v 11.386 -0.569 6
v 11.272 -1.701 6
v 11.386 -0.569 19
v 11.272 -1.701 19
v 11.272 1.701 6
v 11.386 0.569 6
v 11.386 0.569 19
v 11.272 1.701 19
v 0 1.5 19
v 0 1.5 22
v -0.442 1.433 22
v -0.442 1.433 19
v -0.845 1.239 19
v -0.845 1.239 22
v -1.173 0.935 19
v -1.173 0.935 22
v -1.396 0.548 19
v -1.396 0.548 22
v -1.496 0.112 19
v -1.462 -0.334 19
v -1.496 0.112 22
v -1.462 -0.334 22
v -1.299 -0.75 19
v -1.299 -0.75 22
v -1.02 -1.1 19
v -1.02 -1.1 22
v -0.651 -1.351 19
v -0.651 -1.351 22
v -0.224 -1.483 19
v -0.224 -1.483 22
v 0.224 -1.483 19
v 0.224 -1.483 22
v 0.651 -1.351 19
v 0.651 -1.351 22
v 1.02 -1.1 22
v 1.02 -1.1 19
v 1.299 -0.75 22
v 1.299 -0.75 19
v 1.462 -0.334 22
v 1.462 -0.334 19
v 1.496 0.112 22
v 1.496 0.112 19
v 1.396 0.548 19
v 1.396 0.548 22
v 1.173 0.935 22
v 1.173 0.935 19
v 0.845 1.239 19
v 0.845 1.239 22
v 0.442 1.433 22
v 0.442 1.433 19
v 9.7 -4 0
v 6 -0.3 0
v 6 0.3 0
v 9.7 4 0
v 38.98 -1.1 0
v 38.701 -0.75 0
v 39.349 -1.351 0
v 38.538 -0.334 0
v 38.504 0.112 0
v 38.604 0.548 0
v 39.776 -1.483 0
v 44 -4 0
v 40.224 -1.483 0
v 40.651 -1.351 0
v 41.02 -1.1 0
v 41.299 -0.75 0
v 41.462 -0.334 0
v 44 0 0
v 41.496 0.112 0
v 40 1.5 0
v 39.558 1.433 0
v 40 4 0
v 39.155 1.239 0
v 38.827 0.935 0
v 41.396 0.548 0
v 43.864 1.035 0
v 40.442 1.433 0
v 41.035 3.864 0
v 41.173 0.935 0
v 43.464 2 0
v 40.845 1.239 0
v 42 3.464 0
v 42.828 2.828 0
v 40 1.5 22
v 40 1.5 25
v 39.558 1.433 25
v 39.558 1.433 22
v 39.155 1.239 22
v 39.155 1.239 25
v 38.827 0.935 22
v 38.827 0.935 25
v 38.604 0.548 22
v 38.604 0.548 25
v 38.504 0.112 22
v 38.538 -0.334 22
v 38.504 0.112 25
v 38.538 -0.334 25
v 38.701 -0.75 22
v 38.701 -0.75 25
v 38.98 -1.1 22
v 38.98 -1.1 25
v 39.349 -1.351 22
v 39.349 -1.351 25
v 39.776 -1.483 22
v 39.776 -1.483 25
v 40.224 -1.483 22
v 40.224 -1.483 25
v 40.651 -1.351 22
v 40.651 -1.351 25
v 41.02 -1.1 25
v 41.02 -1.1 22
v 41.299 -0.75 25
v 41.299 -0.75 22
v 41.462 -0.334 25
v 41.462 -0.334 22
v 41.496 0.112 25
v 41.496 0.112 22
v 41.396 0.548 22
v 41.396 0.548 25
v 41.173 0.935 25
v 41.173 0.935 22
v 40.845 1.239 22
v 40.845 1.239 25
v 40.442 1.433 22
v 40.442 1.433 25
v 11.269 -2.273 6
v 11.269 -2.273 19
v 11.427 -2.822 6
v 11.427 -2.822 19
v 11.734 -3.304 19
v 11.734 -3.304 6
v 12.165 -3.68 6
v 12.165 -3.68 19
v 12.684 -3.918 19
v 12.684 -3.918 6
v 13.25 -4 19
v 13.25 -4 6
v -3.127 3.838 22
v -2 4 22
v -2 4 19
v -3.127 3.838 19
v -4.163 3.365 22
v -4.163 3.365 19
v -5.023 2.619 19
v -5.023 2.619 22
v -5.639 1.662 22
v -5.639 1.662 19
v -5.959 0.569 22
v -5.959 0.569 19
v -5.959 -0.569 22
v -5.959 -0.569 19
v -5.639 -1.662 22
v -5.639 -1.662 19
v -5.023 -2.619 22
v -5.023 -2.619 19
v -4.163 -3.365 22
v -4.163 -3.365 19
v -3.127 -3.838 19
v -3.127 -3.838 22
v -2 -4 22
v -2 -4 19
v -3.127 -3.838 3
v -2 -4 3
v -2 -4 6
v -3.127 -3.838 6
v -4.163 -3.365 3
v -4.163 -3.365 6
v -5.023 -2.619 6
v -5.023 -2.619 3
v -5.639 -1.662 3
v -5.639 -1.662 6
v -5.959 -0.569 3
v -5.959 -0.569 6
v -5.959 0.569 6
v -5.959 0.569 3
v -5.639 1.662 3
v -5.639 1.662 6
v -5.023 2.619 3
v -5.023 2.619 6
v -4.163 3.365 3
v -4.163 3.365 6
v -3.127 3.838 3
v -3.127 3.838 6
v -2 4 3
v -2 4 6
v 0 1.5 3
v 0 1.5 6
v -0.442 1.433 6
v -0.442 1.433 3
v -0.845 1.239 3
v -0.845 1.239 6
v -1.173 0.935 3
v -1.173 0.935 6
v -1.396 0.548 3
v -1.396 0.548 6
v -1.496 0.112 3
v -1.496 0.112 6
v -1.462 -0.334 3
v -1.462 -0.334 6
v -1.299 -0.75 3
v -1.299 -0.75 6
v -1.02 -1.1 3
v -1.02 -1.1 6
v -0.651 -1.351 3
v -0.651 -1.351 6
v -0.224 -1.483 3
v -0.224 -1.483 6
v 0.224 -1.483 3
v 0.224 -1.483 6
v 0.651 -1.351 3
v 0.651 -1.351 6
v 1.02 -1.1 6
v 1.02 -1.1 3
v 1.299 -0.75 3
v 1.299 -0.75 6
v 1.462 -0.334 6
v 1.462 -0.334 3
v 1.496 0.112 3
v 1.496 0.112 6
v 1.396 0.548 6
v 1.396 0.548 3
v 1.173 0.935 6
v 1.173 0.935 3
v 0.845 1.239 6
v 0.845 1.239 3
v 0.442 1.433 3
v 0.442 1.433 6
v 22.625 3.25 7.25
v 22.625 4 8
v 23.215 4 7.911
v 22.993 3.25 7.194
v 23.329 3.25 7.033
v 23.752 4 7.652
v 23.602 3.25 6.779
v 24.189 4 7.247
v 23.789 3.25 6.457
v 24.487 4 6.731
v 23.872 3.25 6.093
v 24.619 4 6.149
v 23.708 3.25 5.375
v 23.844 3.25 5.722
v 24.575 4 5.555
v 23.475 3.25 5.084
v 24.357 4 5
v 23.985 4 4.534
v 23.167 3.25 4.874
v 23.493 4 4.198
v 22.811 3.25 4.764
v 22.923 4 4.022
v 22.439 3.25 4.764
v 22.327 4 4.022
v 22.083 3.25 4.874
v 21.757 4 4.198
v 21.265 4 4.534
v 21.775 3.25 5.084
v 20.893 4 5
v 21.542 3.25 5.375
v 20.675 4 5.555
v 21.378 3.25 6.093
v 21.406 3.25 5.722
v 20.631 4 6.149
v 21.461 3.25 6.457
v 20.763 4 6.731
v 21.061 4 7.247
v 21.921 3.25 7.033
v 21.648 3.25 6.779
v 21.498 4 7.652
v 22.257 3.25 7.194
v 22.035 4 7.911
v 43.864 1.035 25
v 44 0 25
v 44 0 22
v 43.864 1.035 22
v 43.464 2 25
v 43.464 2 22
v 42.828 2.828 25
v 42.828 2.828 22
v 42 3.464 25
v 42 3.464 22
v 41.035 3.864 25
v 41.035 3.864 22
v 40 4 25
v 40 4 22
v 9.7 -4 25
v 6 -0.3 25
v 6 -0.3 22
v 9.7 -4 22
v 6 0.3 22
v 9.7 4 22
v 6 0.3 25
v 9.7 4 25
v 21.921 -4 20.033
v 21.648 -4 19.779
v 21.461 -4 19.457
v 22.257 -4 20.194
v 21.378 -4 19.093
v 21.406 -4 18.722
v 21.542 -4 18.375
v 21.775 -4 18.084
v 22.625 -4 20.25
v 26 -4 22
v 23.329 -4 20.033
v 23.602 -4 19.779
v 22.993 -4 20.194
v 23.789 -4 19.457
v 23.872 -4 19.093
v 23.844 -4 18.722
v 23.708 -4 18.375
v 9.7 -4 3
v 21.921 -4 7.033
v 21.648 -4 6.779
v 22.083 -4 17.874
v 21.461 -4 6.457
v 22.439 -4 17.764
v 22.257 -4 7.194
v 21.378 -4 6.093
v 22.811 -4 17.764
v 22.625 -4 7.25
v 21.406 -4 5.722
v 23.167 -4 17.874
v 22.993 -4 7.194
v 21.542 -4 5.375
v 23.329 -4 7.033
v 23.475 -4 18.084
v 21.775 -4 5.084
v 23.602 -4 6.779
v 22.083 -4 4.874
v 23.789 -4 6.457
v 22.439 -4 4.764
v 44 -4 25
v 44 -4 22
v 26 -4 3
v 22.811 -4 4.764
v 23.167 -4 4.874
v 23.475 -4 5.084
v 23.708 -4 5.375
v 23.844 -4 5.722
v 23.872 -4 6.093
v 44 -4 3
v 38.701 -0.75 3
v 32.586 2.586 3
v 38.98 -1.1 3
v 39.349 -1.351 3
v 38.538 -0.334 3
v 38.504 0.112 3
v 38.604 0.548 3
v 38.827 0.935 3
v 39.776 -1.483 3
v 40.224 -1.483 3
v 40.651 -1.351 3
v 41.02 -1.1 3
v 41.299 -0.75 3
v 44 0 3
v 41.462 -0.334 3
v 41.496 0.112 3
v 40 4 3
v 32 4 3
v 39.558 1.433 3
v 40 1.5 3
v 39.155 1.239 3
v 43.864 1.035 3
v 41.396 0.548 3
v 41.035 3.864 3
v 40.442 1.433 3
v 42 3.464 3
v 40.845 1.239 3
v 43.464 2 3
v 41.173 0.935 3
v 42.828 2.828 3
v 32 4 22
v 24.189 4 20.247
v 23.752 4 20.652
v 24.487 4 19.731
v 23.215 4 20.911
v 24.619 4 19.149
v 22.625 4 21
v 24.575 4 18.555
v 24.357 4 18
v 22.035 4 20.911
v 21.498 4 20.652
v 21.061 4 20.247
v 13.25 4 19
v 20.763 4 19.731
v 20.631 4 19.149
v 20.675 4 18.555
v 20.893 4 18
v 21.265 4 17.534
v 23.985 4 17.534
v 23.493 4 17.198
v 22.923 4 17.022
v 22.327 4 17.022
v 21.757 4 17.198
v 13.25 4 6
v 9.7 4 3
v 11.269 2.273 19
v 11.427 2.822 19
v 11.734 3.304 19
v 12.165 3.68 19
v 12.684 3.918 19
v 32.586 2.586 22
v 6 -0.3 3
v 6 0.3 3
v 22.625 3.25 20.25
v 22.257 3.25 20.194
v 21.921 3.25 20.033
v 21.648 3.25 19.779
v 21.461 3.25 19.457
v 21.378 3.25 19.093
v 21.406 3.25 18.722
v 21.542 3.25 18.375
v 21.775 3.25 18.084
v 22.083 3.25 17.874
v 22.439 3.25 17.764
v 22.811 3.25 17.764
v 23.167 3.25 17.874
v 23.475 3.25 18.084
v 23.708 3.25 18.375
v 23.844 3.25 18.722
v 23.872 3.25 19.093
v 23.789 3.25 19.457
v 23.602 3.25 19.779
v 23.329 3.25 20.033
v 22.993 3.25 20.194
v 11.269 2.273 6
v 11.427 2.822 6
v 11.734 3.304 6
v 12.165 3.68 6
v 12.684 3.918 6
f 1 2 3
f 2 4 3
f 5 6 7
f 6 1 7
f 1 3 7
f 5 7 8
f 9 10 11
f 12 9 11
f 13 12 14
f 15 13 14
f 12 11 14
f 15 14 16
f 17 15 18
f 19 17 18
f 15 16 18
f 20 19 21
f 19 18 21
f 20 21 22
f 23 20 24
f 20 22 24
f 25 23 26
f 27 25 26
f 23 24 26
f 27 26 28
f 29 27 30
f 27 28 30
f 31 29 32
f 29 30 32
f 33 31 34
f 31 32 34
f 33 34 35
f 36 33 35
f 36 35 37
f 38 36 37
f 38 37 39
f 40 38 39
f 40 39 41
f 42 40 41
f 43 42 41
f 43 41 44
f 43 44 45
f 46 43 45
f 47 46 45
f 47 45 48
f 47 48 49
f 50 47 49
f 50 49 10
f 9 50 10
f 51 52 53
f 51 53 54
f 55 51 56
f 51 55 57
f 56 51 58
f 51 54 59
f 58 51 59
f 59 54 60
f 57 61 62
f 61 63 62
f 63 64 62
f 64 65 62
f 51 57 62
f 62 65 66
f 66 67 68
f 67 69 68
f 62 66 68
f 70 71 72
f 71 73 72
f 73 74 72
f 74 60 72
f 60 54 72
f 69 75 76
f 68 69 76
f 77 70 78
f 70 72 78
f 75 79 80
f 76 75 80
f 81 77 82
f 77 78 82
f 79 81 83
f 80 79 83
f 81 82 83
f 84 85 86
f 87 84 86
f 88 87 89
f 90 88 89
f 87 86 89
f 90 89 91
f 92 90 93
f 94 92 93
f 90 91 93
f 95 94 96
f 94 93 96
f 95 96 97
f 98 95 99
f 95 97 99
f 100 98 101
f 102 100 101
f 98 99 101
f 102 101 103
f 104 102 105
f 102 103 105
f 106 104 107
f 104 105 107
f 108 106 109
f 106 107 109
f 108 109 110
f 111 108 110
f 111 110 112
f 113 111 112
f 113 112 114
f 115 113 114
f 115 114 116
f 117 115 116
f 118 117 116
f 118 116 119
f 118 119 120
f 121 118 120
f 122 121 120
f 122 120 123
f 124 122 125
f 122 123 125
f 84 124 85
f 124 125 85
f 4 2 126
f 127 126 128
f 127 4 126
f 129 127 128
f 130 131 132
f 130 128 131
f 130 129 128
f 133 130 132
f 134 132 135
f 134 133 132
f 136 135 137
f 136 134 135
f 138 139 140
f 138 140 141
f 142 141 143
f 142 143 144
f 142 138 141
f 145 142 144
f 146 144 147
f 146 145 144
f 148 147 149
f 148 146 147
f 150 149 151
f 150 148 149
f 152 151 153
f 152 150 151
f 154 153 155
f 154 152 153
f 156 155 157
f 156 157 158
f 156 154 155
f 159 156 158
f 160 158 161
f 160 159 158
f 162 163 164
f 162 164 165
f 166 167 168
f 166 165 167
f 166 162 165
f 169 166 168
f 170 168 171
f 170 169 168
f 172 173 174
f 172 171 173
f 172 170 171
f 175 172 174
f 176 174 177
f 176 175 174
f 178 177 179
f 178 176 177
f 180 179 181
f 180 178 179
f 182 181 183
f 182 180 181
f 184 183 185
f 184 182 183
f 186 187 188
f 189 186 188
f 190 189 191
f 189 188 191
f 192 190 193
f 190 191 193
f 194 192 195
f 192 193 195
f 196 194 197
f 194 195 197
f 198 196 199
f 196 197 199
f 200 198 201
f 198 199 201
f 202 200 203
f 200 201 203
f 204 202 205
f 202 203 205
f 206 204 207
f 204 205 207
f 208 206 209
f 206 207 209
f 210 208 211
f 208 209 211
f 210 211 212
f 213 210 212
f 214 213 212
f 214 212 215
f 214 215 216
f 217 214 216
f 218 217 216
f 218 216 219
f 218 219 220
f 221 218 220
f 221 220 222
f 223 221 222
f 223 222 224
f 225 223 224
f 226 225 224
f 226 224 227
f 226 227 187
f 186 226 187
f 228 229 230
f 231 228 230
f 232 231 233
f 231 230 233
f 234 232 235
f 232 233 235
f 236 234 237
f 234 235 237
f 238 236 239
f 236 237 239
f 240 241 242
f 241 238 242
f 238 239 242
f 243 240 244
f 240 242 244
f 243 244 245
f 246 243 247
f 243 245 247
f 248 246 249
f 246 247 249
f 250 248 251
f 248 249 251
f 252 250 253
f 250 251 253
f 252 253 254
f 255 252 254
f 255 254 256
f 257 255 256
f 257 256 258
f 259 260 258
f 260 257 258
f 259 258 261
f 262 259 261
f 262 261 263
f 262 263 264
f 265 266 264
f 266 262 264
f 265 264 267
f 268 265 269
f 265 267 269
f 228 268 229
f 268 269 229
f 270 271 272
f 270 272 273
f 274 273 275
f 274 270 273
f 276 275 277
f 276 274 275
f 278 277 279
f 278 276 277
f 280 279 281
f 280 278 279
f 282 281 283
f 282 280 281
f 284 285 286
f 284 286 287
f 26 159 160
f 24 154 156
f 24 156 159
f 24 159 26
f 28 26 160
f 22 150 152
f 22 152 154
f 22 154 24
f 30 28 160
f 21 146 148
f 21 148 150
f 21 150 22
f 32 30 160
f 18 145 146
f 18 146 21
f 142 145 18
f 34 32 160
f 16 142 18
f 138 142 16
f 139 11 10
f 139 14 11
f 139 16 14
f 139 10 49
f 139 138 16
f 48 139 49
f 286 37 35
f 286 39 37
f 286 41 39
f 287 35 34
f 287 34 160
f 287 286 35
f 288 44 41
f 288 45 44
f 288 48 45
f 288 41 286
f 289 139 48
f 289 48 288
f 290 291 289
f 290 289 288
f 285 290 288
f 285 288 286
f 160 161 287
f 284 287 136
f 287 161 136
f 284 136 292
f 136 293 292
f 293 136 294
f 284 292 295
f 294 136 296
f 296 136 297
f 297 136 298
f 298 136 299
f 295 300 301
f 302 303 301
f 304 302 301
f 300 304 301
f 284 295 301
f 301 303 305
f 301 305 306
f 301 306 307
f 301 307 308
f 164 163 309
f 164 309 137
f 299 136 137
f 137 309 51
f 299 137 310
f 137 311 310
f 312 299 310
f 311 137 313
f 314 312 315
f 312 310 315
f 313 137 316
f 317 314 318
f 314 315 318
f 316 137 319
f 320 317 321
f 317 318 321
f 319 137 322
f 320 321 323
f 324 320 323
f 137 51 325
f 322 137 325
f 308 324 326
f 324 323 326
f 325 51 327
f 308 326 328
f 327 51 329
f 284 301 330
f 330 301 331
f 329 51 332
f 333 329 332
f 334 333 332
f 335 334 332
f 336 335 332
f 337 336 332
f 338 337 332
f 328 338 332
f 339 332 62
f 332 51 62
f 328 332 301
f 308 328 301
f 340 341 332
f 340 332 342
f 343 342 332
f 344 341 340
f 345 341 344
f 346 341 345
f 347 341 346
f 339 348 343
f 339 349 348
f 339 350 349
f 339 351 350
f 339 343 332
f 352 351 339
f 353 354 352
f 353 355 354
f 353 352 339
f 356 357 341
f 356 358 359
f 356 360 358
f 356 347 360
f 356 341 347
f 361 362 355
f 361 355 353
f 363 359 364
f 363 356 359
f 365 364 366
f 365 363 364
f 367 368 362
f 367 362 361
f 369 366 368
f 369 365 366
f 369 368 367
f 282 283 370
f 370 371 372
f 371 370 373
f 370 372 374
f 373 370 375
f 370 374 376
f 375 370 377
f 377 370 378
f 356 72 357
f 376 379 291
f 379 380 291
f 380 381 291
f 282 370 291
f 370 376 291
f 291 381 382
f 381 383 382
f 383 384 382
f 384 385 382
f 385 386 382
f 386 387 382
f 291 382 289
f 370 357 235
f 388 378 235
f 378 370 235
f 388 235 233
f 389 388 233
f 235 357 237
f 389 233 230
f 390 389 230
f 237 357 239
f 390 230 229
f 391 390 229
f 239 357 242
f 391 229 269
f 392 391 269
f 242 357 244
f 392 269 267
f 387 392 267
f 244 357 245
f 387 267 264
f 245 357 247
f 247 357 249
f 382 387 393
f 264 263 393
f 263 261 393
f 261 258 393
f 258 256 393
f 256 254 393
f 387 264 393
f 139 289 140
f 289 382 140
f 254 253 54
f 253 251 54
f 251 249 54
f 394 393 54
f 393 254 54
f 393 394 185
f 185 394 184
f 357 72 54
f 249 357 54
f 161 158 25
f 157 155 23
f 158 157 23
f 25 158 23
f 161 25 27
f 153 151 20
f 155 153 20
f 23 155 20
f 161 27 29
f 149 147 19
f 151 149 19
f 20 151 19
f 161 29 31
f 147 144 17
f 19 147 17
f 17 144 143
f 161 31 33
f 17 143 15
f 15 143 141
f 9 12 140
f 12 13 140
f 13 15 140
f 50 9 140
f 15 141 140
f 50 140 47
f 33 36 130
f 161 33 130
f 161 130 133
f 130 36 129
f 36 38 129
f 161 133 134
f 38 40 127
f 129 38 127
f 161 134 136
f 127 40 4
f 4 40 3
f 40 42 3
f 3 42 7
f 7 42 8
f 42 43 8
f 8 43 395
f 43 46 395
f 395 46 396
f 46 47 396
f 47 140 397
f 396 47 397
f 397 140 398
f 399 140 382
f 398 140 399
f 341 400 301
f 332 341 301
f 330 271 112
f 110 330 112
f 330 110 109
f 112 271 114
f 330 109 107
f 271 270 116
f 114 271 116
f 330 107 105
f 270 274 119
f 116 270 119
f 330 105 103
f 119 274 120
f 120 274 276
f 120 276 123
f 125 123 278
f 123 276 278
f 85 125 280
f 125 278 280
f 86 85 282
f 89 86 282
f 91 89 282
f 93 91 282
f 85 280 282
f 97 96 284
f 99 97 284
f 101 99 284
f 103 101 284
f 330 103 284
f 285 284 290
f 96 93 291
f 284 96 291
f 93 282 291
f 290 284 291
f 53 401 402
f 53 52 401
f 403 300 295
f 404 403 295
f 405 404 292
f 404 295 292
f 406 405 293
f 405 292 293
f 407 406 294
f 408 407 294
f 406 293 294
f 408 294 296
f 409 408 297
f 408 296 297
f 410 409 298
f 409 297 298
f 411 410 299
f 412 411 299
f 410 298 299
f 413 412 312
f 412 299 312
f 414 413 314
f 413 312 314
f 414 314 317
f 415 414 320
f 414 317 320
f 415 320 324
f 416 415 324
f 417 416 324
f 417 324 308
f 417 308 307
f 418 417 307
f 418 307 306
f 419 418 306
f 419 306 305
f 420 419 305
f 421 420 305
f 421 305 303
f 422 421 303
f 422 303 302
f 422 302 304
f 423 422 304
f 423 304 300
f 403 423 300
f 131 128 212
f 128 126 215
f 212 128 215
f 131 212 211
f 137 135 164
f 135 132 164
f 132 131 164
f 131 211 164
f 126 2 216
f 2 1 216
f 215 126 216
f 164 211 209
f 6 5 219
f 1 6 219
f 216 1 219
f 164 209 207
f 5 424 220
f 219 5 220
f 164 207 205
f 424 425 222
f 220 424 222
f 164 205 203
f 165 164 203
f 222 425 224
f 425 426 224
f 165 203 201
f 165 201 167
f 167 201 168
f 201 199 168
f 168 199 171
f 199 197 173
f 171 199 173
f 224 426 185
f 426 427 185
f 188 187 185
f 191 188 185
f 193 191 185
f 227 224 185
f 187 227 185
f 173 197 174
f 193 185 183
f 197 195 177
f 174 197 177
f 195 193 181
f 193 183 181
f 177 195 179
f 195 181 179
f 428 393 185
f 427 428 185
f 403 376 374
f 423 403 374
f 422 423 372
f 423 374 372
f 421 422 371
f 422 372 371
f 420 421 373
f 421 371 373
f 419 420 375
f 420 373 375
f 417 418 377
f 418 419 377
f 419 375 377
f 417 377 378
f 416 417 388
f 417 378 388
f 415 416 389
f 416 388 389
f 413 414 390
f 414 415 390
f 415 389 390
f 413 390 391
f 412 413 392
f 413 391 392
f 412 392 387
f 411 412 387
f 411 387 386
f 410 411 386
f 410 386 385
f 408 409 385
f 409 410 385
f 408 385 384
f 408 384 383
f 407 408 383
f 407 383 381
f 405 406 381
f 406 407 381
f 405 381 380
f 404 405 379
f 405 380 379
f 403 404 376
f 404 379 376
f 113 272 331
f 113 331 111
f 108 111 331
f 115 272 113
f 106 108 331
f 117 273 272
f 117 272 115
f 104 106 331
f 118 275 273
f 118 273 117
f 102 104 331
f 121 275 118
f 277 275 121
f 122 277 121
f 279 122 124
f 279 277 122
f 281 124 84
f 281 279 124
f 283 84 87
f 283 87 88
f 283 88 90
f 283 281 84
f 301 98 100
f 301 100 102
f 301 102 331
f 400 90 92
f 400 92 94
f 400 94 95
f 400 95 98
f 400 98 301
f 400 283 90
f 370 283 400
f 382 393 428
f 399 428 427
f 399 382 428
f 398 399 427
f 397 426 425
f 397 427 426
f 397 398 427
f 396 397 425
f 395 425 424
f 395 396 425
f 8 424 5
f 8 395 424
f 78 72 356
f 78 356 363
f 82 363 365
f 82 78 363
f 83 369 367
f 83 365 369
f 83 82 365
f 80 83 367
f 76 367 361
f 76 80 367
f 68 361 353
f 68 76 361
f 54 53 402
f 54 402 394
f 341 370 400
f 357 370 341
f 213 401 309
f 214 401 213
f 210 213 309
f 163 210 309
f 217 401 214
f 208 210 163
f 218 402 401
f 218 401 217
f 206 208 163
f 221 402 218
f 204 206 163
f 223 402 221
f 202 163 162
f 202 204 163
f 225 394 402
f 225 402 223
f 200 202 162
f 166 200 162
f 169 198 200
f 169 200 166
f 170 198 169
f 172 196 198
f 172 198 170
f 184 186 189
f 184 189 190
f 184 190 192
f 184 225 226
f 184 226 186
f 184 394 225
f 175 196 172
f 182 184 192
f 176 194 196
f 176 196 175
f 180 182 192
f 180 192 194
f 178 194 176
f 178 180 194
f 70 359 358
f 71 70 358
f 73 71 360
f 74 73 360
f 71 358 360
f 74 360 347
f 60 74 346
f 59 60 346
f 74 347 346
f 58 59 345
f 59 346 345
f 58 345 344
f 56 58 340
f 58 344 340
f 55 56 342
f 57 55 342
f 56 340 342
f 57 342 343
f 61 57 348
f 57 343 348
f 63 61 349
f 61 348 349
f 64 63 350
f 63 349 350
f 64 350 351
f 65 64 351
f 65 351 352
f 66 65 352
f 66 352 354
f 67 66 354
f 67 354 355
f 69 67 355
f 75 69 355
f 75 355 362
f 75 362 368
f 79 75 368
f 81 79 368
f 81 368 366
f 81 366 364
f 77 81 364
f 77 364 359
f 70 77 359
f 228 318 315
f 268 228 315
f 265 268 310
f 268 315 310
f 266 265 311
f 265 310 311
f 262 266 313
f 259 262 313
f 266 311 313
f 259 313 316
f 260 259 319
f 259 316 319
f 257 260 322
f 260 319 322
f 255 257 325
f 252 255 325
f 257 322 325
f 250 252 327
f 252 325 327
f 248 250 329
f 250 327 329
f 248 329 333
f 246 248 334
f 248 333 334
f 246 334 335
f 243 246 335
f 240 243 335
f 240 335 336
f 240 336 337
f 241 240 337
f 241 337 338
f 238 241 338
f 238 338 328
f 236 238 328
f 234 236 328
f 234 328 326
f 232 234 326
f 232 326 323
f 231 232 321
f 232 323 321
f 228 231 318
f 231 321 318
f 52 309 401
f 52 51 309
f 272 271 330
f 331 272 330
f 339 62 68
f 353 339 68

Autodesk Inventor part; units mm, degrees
ref_plane "YZ Plane" through (0, 0, 0) normal (1, 0, 0) x (0, 1, 0)
ref_plane "XZ Plane" through (0, 0, 0) normal (0, 1, 0) x (-1, 0, 0)
ref_plane "XY Plane" through (0, 0, 0) normal (0, 0, 1) x (1, 0, 0)
sketch "Skizze1" plane through (0, 0, 0) normal (0, 0, 1) x (1, 0, 0)
  circle A0 centre (0, 0) radius 4 construction
  circle A1 centre (40, 0) radius 4 construction
  line L0 (0, 0) -> (40, 0) construction
  arc A2 (0, 4) -> (0, -4) centre (0, 0) ccw
  arc A3 (44, 0) -> (40, 4) centre (40, 0) ccw
  line L1 (0, 4) -> (40, 4)
  line L2 (0, -4) -> (44, -4)
  line L3 (44, -4) -> (44, 0)
  dimension "d0" = 8
  dimension "d1" = 40
extrude "Extrusion1" add sketch "Skizze1" along normal blind 3
sketch "Skizze2" plane through (0, 0, 3) normal (0, 0, 1) x (1, 0, 0)
  arc A0 (0, 4) -> (0, -4) centre (0, 0) ccw projected
  line L0 (0, -4) -> (44, -4) projected
  line L1 (44, -4) -> (44, 0) projected
  arc A1 (44, 0) -> (40, 4) centre (40, 0) ccw projected
  line L2 (40, 4) -> (0, 4) projected
  line L3 (6, 4) -> (34, 4)
  line L4 (34, 4) -> (34, -4)
  line L5 (34, -4) -> (6, -4)
  line L6 (6, -4) -> (6, 4)
  line L7 (0, 0) -> (-4, 0) construction
  line L8 (-4, 0) -> (-4, -4) construction
  line L9 (-4, -4) -> (0, -4) construction
  line L10 (0, -4) -> (0, 0) construction
  dimension "d4" = 10
  dimension "d5" = 4
  dimension "d6" = 10
extrude "Extrusion2" add sketch "Skizze2" along normal blind 9.5 contours L2 L4 L0 L6
sketch "Skizze3" plane through (0, 0, 0) normal (0, 0, -1) x (-1, 0, 0)
  line L0 (-6, -4) -> (-6, 4) projected
  line L1 (-6, 4) -> (0, 4) projected
  arc A0 (0, -4) -> (0, 4) centre (0, 0) ccw projected
  line L2 (0, -4) -> (-6, -4) projected
sketch "Skizze4" plane through (0, 0, 3) normal (0, 0, 1) x (1, 0, 0)
  line L0 (6, -4) -> (6, 4) projected
  line L1 (6, 4) -> (0, 4) projected
  arc A0 (0, 4) -> (0, -4) centre (0, 0) ccw projected
  line L2 (0, -4) -> (6, -4) projected
extrude "Extrusion3" add sketch "Skizze4" along normal blind 3
extrude "Extrusion4" cut sketch "Skizze3" against normal blind 3
sketch "Skizze5" plane through (0, 0, 0) normal (0, 0, -1) x (-1, 0, 0)
  line L0 (-6, -4) -> (-6, 4) projected
  line L1 (-40, 4) -> (-6, 4) projected
  arc A0 (-40, 4) -> (-44, 0) centre (-40, 0) ccw projected
  line L2 (-6, -4) -> (-44, -4) projected
  line L3 (-6, 0.3) -> (-9.7, 4)
  line L4 (-9.7, -4) -> (-6, -0.3)
  line L5 (-9.7, 4) -> (-6, 4)
  line L6 (-6, 0.3) -> (-6, 4)
  line L7 (0, 0) -> (-40, 0) construction
  circle A1 centre (0, 0) radius 4
  line L8 (-6, -4) -> (-6, 4) projected
  line L9 (0, -4) -> (-6, -4) projected
  arc A2 (0, -4) -> (0, 4) centre (0, 0) ccw projected
  line L10 (-6, 4) -> (0, 4) projected
  line L11 (-3.0018, 2.6437) -> (3.0018, -2.6437)
  line L12 (3.0018, -2.6437) -> (-9.9619, -17.3635)
  line L13 (-9.9619, -17.3635) -> (-15.9655, -12.0761)
  line L14 (-15.9655, -12.0761) -> (-3.0018, 2.6437)
  dimension "d13" = 45
  dimension "d14" = 0.6
extrude "Extrusion5" cut sketch "Skizze5" against normal up to surface (3 mm away) contours L0 L14 L2 L4 | L3 L1 L0 | L0 L2 L14
mirror "Spiegeln1" about plane through (20, 0, 12.5) normal (0, 0, 1)
sketch "Skizze6" plane through (6, -4, 19) normal (0, 0, -1) x (-1, 0, 0)
  line L0 (0, 8) -> (0, 0) projected
  line L1 (6, 0) -> (0, 0) projected
  arc A0 (6, 0) -> (6, 8) centre (6, 4) ccw projected
  line L2 (0, 8) -> (6, 8) projected
  line L3 (-3.7, 0) -> (-38, 0) projected
  line L4 (6, 0) -> (-3.7, 0) projected
  line L5 (0, 3.7) -> (-3.7, 0) projected
  line L6 (0, 3.7) -> (0, 4.3) projected
  line L7 (-3.7, 8) -> (0, 4.3) projected
  line L8 (-3.7, 8) -> (6, 8) projected
  arc A1 (6, 0) -> (6, 8) centre (6, 4) ccw projected
extrude "Extrusion6" cut sketch "Skizze6" along normal up to surface (13 mm away) contours L0 L7 L8 | L0 L4 L5
sketch "Skizze7" plane through (0, 0, 19) normal (0, 0, -1) x (-1, 0, 0)
  arc A0 (0, -4) -> (0, 4) centre (0, 0) ccw projected
  circle A1 centre (0, 0) radius 11.4
  circle A2 centre (0, 0) radius 13 construction
  dimension "d19" = 1.6
  dimension "d47" = 26
extrude "Extrusion7" cut sketch "Skizze7" along normal up to surface (13 mm away)
sketch "Skizze8" plane through (44, -4, 22) normal (0, 0, -1) x (-1, 0, 0)
  line L0 (10, 8) -> (10, 0) projected
  line L1 (10, 0) -> (0, 0) projected
  line L2 (10, 8) -> (18, 0)
  line L3 (18, 0) -> (10, 0)
  point P0 (44, 4)
  dimension "d22" = 45
extrude "Extrusion8" cut sketch "Skizze8" along normal up to surface (19 mm away)
sketch "Skizze9" plane through (0, 0, 0) normal (0, 0, -1) x (-1, 0, 0)
  arc A0 (-40, 4) -> (-44, 0) centre (-40, 0) ccw projected
  point P0 (0, 0)
hole "Bohrung1" at (40, 0, 0) direction (0, 0, 1) diameter 3 end through all
hole "Bohrung2" at (0, 0, 0) direction (0, 0, 1) diameter 3 end through all
fillet "Rundung1" radius 2 2 edges at (10.6752, 4, 12.5) (10.6752, -4, 12.5)
chamfer "Fase1" distance 2 angle 45 1 edges at (34, 4, 12.5)
sketch "Skizze12" plane through (40, 4, 3) normal (0, 1, 0) x (1, 0, 0)
  line L0 (-8, 0) -> (-8, -19) projected
  line L1 (-26.7501, -3) -> (-8, -3)
  line L2 (-26.7501, -16) -> (-8, -16)
  point P0 (-40, 3)
  point P1 (-17.375, -3)
  point P2 (-17.375, -16)
  point P3 (-17.375, -3)
  point P4 (-17.375, -16)
hole "Bohrung3" at (22.625, 4, 6) at (22.625, 4, 19) direction (0, -1, 0) diameter 2.5 end through all countersink diameter 4 countersink angle 90
sketch "Skizze13" plane through (0, -4, 22) normal (0, 0, 1) x (1, 0, 0)
  line L0 (0, 0) -> (9.7, 0) projected
  line L1 (9.7, 8) -> (0, 8) projected
  arc A0 (0, 8) -> (0, 0) centre (0, 4) ccw projected
  arc A1 (-2, 8) -> (-2, 0) centre (-2, 4) ccw
  line L2 (-2, 8) -> (0, 8)
  line L3 (0, 0) -> (-2, 0)
  dimension "d59" = 2
extrude "Extrusion11" add sketch "Skizze13" against normal up to surface (3 mm away)
ref_plane "Arbeitsebene1" through (44, -4, 12.5) normal (0, 0, -1) x (-1, 0, 0)
mirror "Spiegeln2" about plane through (44, -4, 12.5) normal (0, 0, -1) of "Extrusion11"
equation "\"d0\" = Finger_diameter"
equation "\"d1\" = FingerLaenge_A"
equation "\"d2\" = FingerWall"
equation "\"d4\" = 2.5 * d5"
equation "\"d6\" = d4"
equation "\"d7\" = -0.5 * FingerWall + 0.5 * Finger_width"
equation "\"d9\" = FingerWall"
equation "\"d11\" = FingerWall"
equation "\"d15\" = FingerWall"
equation "\"d32\" = bearingHole"
equation "\"FingerLaenge_A\" = 40"
equation "\"FingerLaenge_B\" = 25"
equation "\"Hebel_B\" = 25"
equation "\"Finger_width\" = 22"
equation "\"Finger_diameter\" = 8"
equation "\"FingerWall\" = 3"
equation "\"Hebel_basis_2\" = 15"
equation "\"Join_width\" = 3"
equation "\"bearingHole\" = 3"
equation "\"bearingWall\" = 4"
equation "\"support_D\" = 0.25"
properties part number "FingerPartA"
